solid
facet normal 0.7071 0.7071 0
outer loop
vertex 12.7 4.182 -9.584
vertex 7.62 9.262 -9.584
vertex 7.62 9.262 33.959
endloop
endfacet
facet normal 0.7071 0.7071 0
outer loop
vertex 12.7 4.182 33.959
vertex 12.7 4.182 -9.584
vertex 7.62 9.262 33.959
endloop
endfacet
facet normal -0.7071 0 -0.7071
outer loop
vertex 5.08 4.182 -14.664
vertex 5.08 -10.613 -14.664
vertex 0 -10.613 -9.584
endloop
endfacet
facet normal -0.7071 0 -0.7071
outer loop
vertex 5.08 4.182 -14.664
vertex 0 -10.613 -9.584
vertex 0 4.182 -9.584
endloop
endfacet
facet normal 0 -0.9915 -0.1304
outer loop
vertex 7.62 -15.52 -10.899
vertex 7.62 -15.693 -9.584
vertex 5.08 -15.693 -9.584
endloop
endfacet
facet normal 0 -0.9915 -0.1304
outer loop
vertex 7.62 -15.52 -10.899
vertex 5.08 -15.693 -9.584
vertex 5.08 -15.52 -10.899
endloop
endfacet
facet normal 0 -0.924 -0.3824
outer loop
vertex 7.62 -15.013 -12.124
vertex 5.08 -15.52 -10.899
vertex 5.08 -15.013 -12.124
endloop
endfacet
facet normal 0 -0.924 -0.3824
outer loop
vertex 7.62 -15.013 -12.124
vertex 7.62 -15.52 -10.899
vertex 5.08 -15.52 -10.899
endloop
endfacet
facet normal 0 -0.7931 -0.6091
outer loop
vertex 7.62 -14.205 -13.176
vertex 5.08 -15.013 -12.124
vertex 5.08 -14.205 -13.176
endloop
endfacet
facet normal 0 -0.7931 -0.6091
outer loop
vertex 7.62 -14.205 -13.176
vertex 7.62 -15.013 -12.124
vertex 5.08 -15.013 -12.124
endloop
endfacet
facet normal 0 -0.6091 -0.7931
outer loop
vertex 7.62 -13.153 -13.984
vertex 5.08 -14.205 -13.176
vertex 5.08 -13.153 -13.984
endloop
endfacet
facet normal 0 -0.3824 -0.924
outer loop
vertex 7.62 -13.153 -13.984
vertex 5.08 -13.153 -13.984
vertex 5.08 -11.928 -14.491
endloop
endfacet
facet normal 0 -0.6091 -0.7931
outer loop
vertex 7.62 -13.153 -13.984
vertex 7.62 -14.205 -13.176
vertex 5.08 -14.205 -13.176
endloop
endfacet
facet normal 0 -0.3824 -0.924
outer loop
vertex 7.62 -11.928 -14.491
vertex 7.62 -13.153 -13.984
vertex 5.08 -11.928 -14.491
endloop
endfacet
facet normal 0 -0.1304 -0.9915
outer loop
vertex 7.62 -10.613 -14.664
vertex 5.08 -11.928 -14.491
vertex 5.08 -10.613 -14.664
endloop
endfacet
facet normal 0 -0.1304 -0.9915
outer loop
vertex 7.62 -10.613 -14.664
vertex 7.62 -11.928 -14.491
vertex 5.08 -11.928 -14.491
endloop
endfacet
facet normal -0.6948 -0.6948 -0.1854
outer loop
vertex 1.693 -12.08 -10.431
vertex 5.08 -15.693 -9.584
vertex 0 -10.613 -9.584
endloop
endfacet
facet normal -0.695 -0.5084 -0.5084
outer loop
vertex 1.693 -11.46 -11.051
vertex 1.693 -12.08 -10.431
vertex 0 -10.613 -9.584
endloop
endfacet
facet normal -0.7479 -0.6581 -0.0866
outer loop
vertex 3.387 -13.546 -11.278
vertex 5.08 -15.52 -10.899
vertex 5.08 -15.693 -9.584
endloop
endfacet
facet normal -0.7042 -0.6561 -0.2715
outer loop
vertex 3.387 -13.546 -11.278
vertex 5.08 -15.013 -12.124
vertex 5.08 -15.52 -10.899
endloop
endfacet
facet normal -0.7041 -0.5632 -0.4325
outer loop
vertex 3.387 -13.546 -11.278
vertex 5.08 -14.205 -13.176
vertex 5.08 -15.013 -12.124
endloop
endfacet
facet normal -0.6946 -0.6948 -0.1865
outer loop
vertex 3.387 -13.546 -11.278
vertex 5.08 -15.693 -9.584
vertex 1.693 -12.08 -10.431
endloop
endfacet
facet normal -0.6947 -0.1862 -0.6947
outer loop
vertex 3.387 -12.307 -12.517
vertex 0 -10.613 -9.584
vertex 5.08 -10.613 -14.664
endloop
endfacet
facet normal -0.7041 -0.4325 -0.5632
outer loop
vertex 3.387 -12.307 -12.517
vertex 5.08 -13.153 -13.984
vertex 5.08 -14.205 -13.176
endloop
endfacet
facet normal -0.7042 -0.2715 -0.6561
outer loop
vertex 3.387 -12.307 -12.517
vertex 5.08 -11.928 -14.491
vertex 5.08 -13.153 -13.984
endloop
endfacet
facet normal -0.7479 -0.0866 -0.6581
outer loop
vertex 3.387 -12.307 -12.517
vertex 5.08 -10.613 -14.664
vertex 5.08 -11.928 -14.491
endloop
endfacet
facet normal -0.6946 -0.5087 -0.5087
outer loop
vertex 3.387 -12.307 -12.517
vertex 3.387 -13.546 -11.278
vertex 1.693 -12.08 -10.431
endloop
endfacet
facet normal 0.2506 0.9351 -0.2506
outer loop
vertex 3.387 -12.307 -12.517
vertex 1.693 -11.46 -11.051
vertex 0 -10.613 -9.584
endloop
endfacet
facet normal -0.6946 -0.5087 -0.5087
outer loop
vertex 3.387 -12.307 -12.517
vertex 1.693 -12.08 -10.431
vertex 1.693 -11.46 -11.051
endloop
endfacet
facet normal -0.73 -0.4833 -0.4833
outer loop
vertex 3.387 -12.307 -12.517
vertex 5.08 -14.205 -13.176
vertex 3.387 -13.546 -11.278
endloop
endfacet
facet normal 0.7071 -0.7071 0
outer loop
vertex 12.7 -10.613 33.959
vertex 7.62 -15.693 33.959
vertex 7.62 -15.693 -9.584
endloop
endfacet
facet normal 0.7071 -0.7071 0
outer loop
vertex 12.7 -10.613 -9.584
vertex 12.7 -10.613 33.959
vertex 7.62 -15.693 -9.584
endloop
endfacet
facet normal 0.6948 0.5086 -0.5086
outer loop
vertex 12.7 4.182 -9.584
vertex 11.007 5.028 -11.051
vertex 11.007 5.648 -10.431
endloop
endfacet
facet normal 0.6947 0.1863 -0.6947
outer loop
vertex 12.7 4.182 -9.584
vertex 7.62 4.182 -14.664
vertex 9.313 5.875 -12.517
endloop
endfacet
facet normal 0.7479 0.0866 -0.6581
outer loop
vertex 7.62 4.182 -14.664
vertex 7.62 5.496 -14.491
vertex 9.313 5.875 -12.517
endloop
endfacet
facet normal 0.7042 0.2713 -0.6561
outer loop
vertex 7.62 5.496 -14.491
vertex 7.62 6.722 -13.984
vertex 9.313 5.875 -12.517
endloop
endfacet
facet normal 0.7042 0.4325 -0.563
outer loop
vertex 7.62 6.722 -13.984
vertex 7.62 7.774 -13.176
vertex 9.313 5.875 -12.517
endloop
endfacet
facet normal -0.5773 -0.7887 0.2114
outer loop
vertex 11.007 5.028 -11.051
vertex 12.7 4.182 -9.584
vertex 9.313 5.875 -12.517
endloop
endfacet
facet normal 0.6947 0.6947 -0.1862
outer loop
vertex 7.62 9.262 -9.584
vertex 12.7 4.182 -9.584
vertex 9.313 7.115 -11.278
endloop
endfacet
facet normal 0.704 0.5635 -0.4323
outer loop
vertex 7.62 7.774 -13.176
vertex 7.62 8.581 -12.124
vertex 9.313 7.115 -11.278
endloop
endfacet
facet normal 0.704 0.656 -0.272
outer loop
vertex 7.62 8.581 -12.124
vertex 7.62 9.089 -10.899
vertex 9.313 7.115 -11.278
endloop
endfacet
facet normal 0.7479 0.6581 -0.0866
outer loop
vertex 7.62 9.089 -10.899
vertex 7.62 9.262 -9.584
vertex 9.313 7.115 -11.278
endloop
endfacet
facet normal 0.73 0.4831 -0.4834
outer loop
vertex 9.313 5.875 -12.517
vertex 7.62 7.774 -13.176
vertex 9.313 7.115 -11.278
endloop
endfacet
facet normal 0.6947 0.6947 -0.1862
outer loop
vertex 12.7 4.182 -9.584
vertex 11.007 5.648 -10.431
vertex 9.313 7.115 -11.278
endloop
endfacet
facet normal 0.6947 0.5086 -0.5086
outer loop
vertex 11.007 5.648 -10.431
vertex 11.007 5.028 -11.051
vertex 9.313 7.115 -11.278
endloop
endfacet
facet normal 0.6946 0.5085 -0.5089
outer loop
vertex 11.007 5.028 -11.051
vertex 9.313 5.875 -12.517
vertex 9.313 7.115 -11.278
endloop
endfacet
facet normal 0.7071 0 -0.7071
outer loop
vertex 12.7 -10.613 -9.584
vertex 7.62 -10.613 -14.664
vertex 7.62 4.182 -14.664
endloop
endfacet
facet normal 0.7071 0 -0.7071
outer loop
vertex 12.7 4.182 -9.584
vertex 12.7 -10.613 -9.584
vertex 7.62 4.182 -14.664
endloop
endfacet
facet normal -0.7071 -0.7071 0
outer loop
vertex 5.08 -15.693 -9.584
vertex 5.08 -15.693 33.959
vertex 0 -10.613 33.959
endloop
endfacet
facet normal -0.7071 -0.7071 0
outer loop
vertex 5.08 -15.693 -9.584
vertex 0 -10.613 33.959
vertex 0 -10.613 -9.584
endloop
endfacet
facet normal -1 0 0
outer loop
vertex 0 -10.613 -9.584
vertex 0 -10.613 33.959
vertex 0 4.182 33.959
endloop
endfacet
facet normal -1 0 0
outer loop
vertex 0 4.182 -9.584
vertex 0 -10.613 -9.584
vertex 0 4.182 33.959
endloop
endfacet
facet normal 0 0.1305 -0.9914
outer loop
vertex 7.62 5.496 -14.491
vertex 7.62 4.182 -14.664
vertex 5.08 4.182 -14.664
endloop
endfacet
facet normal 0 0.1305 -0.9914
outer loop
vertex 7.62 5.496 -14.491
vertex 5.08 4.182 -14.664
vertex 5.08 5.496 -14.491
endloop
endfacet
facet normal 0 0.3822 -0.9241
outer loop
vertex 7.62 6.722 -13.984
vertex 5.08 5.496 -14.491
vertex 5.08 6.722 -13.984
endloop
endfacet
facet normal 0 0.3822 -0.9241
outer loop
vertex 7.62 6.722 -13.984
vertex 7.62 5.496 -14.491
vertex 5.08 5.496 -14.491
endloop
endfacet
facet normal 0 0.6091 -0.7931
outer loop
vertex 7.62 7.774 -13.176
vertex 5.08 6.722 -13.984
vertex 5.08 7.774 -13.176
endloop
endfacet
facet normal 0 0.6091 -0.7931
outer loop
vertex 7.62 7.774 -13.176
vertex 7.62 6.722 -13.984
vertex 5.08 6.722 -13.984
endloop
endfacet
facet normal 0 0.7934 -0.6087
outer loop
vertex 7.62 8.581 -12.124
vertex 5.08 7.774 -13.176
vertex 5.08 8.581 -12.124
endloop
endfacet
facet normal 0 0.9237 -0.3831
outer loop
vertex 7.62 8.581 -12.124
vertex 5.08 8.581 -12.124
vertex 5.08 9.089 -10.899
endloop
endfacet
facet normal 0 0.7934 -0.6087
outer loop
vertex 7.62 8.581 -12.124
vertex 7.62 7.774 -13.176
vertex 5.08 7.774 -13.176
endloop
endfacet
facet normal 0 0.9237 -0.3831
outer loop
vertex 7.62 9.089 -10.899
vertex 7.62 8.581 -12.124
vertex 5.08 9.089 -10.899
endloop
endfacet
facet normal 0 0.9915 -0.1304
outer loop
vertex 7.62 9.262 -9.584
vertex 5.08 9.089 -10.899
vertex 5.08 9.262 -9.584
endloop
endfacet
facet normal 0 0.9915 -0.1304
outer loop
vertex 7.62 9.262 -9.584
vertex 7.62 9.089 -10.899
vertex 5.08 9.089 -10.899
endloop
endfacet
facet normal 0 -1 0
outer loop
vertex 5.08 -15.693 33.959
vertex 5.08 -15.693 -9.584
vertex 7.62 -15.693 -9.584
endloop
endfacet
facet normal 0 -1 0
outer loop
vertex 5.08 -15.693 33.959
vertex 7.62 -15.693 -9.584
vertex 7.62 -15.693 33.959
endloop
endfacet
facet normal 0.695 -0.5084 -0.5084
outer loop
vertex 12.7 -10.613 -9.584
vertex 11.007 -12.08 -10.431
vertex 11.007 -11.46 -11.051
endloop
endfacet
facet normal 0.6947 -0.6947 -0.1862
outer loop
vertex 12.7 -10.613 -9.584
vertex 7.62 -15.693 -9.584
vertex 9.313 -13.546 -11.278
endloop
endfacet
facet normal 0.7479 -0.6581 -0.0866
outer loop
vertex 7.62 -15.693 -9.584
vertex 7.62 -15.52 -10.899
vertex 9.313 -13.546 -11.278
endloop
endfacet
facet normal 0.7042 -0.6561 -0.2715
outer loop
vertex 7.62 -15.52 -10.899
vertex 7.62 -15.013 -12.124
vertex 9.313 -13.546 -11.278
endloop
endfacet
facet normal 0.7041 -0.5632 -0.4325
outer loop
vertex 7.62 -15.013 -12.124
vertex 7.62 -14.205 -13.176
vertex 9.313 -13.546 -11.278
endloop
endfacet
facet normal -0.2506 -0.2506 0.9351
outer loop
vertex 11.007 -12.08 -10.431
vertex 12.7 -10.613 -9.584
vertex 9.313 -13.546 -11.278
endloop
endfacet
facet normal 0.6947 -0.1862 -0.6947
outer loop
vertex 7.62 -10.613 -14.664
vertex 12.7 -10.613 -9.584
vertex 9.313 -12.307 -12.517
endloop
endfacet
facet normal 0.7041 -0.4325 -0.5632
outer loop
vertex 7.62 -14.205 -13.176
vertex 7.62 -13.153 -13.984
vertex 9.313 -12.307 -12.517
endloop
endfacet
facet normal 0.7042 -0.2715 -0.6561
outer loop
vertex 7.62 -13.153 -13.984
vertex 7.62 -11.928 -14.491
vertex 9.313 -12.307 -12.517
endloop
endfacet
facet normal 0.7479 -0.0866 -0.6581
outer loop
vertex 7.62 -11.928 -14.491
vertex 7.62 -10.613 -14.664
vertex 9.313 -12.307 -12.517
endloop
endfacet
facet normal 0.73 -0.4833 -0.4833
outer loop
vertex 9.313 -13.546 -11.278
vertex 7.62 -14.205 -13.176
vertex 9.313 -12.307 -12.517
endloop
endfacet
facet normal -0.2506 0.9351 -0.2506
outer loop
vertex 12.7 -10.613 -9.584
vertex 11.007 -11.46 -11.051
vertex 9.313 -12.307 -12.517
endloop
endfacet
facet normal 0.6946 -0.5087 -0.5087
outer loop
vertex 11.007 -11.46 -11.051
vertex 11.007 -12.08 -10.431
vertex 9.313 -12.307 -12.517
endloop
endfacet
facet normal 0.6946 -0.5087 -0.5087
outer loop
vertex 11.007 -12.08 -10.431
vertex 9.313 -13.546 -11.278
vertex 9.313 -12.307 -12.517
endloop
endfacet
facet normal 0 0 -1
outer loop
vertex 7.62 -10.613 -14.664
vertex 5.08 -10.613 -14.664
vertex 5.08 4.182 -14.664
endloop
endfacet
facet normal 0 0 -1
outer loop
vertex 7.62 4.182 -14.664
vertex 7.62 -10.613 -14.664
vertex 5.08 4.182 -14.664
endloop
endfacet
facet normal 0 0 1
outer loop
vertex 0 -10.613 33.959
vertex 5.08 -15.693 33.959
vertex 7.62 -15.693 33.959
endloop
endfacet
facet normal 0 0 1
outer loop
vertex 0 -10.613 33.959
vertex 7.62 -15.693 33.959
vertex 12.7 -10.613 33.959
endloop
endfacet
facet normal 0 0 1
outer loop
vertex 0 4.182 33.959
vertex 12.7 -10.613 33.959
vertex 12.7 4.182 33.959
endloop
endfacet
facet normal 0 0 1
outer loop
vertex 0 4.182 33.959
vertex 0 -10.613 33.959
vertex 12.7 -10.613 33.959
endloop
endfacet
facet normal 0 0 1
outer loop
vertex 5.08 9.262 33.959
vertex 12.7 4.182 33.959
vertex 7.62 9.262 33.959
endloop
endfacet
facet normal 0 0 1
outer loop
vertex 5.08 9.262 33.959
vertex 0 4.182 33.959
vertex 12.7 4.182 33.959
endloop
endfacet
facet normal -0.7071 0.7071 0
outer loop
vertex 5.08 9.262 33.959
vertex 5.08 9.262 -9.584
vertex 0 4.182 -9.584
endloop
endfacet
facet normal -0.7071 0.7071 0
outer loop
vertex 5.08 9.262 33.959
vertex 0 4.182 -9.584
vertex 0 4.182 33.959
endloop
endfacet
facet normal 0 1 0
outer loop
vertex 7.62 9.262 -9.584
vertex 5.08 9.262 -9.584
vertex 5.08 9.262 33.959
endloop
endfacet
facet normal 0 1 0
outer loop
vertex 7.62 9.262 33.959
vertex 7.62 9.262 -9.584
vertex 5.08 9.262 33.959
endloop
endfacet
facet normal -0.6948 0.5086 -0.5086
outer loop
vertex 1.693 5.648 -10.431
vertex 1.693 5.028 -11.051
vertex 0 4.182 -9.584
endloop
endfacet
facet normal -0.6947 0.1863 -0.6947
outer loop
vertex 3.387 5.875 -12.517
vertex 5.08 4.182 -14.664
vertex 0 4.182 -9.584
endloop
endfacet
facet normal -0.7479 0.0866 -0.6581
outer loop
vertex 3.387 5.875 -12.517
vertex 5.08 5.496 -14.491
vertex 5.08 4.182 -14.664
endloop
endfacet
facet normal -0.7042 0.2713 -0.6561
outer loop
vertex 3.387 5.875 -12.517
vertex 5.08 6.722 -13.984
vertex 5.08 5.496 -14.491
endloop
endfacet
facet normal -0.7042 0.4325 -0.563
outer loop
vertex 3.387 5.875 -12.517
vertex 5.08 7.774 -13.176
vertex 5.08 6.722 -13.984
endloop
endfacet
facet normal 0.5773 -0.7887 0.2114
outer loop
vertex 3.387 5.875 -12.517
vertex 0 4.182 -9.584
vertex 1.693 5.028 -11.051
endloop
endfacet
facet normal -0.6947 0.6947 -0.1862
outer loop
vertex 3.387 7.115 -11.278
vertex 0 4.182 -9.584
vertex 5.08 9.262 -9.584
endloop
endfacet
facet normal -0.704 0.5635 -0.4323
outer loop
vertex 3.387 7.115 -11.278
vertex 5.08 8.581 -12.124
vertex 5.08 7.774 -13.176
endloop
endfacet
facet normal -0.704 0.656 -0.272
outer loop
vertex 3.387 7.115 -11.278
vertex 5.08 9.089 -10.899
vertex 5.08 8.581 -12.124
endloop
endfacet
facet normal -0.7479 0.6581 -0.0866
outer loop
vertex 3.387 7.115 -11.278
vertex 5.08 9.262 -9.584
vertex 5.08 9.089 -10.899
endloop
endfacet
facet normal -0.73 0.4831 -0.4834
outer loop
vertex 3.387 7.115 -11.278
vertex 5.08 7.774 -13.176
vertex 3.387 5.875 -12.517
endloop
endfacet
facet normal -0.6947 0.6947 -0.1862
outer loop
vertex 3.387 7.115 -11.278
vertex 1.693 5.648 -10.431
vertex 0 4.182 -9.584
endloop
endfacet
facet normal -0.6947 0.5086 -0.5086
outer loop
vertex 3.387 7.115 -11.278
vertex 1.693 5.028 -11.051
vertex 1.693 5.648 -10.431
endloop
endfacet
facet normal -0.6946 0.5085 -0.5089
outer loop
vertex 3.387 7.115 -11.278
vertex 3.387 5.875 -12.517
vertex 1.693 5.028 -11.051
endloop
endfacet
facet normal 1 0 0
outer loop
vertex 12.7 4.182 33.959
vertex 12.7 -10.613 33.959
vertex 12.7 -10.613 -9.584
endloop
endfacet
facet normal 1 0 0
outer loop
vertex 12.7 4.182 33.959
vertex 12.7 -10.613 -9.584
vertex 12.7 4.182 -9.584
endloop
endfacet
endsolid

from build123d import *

# Parameters (mm, degrees)
F0_W     = 24.954888
F0_H     = 48.623441
F1_DEPTH = 12.7
F2_R     = 5.08
F3_SIZE  = 5.08


with BuildPart() as f1:
    # F0 (on Right) → F1 (new body)
    with BuildSketch(Plane.YZ):
        with Locations((-3.215835, 9.647509)):
            Rectangle(F0_W, F0_H)
    extrude(amount=F1_DEPTH)

    # F2
    f2_edges = [f1.edges().sort_by_distance(p)[0] for p in [
        (6.35, -15.693279, -14.664212),
        (6.35, 9.261609, -14.664212),
    ]]
    fillet(f2_edges, radius=F2_R)

    # F3
    f3_edges = [f1.edges().sort_by_distance(p)[0] for p in [
        (12.7, -3.215835, -14.664212),
        (0, -3.215835, -14.664212),
    ]]
    chamfer(f3_edges, length=F3_SIZE)


solid = f1.part
